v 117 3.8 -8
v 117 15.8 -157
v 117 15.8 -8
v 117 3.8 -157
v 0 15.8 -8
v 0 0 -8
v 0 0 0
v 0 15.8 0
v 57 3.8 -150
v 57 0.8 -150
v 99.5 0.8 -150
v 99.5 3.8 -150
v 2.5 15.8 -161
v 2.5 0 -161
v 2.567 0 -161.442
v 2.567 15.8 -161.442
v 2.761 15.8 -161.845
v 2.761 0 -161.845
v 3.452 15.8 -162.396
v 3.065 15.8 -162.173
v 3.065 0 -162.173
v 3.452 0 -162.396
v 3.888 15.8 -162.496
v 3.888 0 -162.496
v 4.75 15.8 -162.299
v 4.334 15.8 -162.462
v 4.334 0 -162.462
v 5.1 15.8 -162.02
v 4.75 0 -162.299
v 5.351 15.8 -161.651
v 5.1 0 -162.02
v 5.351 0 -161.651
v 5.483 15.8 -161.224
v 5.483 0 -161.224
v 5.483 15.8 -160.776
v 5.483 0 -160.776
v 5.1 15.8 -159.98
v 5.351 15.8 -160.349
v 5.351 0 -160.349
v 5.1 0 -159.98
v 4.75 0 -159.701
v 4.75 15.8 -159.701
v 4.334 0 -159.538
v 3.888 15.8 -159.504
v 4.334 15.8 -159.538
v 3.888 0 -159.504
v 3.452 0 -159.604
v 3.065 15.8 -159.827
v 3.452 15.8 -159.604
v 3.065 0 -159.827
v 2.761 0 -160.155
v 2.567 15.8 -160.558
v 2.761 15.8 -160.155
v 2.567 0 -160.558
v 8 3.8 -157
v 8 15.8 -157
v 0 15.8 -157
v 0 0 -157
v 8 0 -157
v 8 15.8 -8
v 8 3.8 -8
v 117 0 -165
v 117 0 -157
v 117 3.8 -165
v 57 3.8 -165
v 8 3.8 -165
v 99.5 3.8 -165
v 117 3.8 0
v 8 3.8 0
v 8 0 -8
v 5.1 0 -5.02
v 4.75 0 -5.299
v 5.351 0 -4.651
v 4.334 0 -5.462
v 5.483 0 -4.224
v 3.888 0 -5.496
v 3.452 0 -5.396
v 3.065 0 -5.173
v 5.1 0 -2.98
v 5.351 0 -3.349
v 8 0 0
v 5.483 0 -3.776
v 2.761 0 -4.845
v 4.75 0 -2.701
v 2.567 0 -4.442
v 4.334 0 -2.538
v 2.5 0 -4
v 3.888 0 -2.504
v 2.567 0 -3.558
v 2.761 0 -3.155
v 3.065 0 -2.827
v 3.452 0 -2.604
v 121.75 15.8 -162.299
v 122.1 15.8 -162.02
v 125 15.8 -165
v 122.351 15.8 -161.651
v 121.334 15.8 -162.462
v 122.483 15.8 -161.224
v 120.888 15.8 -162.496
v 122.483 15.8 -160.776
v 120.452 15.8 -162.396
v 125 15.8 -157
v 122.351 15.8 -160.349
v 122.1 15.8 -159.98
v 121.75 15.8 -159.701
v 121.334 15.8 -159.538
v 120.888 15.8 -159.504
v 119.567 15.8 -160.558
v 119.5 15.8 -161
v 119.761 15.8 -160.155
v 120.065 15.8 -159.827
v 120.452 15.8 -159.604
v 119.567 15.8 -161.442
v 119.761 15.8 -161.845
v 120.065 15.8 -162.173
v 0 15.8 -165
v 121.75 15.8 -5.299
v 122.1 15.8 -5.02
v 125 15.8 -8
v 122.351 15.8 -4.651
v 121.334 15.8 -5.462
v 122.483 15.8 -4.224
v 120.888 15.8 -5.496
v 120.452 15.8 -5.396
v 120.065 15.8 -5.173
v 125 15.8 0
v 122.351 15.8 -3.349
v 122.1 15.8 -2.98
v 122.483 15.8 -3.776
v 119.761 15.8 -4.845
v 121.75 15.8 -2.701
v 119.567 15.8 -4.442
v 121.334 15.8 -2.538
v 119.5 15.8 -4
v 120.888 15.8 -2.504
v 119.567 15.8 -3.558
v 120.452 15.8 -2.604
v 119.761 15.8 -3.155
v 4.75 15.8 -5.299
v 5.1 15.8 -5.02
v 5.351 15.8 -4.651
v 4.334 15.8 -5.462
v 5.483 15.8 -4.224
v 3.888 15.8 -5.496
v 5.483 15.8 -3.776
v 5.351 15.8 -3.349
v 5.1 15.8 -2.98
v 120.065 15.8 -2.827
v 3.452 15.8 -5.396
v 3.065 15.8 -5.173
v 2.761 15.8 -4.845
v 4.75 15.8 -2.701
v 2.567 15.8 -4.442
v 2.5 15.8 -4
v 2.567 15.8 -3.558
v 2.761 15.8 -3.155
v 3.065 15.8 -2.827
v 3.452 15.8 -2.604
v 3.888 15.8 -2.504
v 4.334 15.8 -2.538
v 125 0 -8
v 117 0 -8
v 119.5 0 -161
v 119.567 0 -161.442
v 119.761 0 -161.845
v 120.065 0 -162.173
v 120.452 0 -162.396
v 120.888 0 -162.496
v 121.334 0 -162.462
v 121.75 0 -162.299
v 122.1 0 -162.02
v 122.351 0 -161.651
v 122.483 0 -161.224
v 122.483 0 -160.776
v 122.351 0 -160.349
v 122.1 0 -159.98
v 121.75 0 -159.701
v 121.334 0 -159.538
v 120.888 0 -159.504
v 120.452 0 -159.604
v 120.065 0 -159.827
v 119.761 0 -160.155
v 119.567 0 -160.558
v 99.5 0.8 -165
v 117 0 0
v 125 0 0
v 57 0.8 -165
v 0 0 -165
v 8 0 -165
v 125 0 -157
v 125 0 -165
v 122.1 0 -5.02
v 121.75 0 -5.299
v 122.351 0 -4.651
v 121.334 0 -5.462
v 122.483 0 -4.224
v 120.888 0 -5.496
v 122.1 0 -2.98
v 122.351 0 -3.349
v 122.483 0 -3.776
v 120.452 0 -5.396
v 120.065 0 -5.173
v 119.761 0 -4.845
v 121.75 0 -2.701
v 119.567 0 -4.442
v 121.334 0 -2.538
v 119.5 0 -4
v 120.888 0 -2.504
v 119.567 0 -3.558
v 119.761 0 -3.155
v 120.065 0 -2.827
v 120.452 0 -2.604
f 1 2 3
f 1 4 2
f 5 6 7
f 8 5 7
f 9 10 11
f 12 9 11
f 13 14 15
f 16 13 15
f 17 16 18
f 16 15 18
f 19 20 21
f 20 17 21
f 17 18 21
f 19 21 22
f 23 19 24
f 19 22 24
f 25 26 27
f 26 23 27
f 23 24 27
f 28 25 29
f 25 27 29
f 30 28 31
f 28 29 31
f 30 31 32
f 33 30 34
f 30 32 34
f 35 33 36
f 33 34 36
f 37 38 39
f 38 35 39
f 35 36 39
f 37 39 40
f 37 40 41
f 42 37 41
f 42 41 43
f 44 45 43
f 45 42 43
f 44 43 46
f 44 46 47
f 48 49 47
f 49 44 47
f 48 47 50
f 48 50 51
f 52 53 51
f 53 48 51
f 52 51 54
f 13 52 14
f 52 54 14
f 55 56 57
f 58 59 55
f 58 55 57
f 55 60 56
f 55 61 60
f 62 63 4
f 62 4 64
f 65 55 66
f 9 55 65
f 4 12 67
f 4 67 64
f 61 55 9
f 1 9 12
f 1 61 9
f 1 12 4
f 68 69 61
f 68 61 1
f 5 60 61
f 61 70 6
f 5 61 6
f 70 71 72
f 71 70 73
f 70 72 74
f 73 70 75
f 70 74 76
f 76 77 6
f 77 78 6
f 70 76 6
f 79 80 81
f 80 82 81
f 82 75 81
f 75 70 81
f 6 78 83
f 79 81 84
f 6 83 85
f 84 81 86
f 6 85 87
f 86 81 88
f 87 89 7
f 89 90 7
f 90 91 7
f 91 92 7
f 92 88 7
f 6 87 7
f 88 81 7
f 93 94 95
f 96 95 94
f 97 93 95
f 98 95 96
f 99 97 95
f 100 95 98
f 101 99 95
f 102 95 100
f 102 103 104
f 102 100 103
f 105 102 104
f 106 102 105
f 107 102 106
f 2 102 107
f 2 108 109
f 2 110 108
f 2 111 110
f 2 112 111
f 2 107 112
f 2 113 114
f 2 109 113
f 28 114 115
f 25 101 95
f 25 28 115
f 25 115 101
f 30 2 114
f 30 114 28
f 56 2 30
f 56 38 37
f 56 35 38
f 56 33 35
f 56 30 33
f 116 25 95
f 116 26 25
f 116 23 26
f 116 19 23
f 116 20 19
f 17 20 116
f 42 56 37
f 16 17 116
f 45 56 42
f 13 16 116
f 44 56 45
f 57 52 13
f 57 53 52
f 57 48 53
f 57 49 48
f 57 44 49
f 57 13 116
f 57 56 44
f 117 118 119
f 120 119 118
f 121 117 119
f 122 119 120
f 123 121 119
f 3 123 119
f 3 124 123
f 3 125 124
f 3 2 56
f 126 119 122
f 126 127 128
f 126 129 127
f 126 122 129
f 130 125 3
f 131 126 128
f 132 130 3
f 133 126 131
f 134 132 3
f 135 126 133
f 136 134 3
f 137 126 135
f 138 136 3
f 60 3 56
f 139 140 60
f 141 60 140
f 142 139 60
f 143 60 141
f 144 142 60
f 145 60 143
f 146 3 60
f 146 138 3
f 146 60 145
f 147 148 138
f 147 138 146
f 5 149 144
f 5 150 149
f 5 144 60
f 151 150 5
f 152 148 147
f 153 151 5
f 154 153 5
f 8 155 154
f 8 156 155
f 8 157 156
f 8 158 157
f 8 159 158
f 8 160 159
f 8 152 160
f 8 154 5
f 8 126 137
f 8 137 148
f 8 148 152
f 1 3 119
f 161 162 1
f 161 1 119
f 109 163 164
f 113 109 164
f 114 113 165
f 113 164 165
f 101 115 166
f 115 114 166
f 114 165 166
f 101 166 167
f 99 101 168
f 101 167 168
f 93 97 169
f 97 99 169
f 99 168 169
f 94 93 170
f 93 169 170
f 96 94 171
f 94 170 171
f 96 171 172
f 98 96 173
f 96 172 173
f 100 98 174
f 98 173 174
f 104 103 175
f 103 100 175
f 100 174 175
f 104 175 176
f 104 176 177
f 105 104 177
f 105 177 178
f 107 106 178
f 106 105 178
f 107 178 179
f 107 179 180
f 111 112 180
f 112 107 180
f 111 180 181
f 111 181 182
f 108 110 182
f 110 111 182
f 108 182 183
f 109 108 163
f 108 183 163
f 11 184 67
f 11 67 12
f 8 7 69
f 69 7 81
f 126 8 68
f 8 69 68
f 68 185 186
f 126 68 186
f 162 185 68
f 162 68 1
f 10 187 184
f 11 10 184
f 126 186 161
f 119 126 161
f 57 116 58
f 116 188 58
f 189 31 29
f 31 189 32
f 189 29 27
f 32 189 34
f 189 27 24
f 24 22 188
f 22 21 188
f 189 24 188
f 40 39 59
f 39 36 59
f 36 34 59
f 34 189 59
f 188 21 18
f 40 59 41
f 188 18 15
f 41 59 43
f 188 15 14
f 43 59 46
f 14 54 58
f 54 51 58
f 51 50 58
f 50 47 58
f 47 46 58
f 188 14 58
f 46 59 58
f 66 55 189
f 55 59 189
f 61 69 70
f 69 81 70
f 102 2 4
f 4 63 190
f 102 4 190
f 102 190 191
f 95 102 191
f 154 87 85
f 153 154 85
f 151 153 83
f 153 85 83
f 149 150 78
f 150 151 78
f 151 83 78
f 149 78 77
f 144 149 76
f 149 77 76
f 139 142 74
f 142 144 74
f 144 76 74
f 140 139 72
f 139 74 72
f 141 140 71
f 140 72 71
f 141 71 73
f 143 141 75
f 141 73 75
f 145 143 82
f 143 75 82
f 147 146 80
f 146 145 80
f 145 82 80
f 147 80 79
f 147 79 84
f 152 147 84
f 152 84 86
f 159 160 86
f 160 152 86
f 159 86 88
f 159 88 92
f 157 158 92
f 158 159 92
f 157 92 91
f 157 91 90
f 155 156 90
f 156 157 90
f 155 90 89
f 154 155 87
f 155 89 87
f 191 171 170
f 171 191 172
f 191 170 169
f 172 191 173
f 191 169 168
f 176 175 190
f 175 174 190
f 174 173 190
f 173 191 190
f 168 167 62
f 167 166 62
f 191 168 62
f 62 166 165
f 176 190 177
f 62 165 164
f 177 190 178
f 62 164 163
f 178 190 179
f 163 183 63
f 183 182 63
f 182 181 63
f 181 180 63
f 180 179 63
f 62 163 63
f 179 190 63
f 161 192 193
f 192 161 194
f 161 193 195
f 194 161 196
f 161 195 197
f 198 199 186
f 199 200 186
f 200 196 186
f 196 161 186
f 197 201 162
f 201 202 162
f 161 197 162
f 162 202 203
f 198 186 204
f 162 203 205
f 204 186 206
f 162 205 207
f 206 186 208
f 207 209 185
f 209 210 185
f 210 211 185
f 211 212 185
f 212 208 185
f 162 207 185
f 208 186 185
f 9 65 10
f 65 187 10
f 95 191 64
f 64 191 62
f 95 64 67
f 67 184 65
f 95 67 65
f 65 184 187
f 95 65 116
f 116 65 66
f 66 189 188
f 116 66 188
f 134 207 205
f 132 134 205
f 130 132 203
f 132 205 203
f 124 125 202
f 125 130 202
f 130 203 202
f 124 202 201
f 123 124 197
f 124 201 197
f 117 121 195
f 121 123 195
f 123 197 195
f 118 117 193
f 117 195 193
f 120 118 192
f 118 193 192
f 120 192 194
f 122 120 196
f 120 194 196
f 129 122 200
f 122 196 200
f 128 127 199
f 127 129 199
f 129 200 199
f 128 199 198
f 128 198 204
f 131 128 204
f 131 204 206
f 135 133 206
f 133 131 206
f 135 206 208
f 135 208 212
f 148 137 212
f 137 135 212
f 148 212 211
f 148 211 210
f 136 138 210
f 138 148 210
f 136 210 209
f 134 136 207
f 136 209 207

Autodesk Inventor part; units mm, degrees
ref_plane "YZ Plane" through (0, 0, 0) normal (1, 0, 0) x (0, 1, 0)
ref_plane "XZ Plane" through (0, 0, 0) normal (0, 1, 0) x (-1, 0, 0)
ref_plane "XY Plane" through (0, 0, 0) normal (0, 0, 1) x (1, 0, 0)
sketch "Sketch1" plane through (0, 0, 0) normal (0, 1, 0) x (-1, 0, 0)
  line L0 (0, 0) -> (-125, 0)
  line L1 (-125, 0) -> (-125, -165)
  line L2 (-125, -165) -> (0, -165)
  line L3 (0, -165) -> (0, 0)
  circle A0 centre (-4, -4) radius 1.5
  circle A1 centre (-4, -161) radius 1.5
  circle A2 centre (-121, -4) radius 1.5
  circle A3 centre (-121, -161) radius 1.5
  line L4 (-125, 0) -> (-117, 0)
  line L5 (-117, 0) -> (-117, -8)
  line L6 (-117, -8) -> (-125, -8)
  line L7 (-125, -8) -> (-125, 0)
  line L8 (-125, -165) -> (-117, -165)
  line L9 (-117, -165) -> (-117, -157)
  line L10 (-117, -157) -> (-125, -157)
  line L11 (-125, -157) -> (-125, -165)
  line L12 (0, 0) -> (-8, 0)
  line L13 (-8, 0) -> (-8, -8)
  line L14 (-8, -8) -> (0, -8)
  line L15 (0, -8) -> (0, 0)
  line L16 (0, -165) -> (-8, -165)
  line L17 (-8, -165) -> (-8, -157)
  line L18 (-8, -157) -> (0, -157)
  line L19 (0, -157) -> (0, -165)
  line L20 (-117, -8) -> (-125, -8)
  line L21 (-125, -8) -> (-125, -157)
  line L22 (-125, -157) -> (-117, -157)
  line L23 (-117, -157) -> (-117, -8)
  line L24 (0, -8) -> (-8, -8)
  line L25 (-8, -8) -> (-8, -157)
  line L26 (-8, -157) -> (0, -157)
  line L27 (0, -157) -> (0, -8)
  dimension "d0" = 125
  dimension "d1" = 165
  dimension "d2" = 3
  dimension "d3" = 3
  dimension "d4" = 3
  dimension "d5" = 3
  dimension "d8" = 8
  dimension "d9" = 8
  dimension "d10" = 8
  dimension "d11" = 8
  dimension "d12" = 8
  dimension "d13" = 8
  dimension "d14" = 8
  dimension "d15" = 8
extrude "Extrusion1" add sketch "Sketch1" along normal blind 15.8 contours L3 L14 L13 L0 | L13 L25 L17 L2 L9 L23 L5 L0 | L5 L6 L1 L0 | L3 L2 L17 L18 | L9 L2 L1 L10
sketch "Sketch2" plane through (125, 0, -165) normal (0, 0, -1) x (-1, 0, 0)
  line L0 (8, 15.8) -> (0, 15.8) projected
  line L1 (8, 15.8) -> (117, 15.8)
  line L2 (117, 15.8) -> (117, 0.8)
  line L3 (117, 0.8) -> (8, 0.8)
  line L4 (8, 0.8) -> (8, 15.8)
  line L5 (0, 0) -> (125, 0) projected
  line L6 (8, 0.8) -> (117, 0.8)
  line L7 (117, 0.8) -> (117, 0)
  line L8 (117, 0) -> (8, 0)
  line L9 (8, 0) -> (8, 0.8)
  line L10 (8, 0.8) -> (68, 0.8)
  line L11 (68, 0.8) -> (68, 0)
  line L12 (68, 0) -> (8, 0)
  line L13 (8, 0) -> (8, 0.8)
  dimension "d16" = 109
  dimension "d17" = 15
  dimension "d18" = 60
  dimension "d19" = 0.8
extrude "Extrusion2" cut sketch "Sketch2" against normal blind 15 contours L3 L11 L5 L9
sketch "Sketch3" plane through (0, 0, 0) normal (0, -1, 0) x (1, 0, 0)
  line L0 (57, -150) -> (117, -150) projected
  line L1 (0, 0) -> (125, 0) projected
  line L2 (117, -150) -> (57, -150)
  line L3 (57, -150) -> (57, 0)
  line L4 (57, 0) -> (117, 0)
  line L5 (117, 0) -> (117, -150)
  line L6 (125, -165) -> (0, -165) projected
  line L7 (57, 0) -> (8, 0)
  line L8 (8, 0) -> (8, -165)
  line L9 (8, -165) -> (57, -165)
  line L10 (57, -165) -> (57, 0)
  line L11 (125, -165) -> (117, -165) projected
  line L12 (117, -165) -> (99.5, -165)
  line L13 (99.5, -165) -> (99.5, -150)
  line L14 (99.5, -150) -> (117, -150)
  line L15 (117, -150) -> (117, -165)
  dimension "d22" = 60
  dimension "d23" = 49
  dimension "d24" = 17.5
extrude "Extrusion3" cut sketch "Sketch3" against normal blind 3.8 contours L3 L1 L5 L0 | L10 L6 L8 L1 L3 | L0 L15 L6 L13
properties part number "7InchScreen"
